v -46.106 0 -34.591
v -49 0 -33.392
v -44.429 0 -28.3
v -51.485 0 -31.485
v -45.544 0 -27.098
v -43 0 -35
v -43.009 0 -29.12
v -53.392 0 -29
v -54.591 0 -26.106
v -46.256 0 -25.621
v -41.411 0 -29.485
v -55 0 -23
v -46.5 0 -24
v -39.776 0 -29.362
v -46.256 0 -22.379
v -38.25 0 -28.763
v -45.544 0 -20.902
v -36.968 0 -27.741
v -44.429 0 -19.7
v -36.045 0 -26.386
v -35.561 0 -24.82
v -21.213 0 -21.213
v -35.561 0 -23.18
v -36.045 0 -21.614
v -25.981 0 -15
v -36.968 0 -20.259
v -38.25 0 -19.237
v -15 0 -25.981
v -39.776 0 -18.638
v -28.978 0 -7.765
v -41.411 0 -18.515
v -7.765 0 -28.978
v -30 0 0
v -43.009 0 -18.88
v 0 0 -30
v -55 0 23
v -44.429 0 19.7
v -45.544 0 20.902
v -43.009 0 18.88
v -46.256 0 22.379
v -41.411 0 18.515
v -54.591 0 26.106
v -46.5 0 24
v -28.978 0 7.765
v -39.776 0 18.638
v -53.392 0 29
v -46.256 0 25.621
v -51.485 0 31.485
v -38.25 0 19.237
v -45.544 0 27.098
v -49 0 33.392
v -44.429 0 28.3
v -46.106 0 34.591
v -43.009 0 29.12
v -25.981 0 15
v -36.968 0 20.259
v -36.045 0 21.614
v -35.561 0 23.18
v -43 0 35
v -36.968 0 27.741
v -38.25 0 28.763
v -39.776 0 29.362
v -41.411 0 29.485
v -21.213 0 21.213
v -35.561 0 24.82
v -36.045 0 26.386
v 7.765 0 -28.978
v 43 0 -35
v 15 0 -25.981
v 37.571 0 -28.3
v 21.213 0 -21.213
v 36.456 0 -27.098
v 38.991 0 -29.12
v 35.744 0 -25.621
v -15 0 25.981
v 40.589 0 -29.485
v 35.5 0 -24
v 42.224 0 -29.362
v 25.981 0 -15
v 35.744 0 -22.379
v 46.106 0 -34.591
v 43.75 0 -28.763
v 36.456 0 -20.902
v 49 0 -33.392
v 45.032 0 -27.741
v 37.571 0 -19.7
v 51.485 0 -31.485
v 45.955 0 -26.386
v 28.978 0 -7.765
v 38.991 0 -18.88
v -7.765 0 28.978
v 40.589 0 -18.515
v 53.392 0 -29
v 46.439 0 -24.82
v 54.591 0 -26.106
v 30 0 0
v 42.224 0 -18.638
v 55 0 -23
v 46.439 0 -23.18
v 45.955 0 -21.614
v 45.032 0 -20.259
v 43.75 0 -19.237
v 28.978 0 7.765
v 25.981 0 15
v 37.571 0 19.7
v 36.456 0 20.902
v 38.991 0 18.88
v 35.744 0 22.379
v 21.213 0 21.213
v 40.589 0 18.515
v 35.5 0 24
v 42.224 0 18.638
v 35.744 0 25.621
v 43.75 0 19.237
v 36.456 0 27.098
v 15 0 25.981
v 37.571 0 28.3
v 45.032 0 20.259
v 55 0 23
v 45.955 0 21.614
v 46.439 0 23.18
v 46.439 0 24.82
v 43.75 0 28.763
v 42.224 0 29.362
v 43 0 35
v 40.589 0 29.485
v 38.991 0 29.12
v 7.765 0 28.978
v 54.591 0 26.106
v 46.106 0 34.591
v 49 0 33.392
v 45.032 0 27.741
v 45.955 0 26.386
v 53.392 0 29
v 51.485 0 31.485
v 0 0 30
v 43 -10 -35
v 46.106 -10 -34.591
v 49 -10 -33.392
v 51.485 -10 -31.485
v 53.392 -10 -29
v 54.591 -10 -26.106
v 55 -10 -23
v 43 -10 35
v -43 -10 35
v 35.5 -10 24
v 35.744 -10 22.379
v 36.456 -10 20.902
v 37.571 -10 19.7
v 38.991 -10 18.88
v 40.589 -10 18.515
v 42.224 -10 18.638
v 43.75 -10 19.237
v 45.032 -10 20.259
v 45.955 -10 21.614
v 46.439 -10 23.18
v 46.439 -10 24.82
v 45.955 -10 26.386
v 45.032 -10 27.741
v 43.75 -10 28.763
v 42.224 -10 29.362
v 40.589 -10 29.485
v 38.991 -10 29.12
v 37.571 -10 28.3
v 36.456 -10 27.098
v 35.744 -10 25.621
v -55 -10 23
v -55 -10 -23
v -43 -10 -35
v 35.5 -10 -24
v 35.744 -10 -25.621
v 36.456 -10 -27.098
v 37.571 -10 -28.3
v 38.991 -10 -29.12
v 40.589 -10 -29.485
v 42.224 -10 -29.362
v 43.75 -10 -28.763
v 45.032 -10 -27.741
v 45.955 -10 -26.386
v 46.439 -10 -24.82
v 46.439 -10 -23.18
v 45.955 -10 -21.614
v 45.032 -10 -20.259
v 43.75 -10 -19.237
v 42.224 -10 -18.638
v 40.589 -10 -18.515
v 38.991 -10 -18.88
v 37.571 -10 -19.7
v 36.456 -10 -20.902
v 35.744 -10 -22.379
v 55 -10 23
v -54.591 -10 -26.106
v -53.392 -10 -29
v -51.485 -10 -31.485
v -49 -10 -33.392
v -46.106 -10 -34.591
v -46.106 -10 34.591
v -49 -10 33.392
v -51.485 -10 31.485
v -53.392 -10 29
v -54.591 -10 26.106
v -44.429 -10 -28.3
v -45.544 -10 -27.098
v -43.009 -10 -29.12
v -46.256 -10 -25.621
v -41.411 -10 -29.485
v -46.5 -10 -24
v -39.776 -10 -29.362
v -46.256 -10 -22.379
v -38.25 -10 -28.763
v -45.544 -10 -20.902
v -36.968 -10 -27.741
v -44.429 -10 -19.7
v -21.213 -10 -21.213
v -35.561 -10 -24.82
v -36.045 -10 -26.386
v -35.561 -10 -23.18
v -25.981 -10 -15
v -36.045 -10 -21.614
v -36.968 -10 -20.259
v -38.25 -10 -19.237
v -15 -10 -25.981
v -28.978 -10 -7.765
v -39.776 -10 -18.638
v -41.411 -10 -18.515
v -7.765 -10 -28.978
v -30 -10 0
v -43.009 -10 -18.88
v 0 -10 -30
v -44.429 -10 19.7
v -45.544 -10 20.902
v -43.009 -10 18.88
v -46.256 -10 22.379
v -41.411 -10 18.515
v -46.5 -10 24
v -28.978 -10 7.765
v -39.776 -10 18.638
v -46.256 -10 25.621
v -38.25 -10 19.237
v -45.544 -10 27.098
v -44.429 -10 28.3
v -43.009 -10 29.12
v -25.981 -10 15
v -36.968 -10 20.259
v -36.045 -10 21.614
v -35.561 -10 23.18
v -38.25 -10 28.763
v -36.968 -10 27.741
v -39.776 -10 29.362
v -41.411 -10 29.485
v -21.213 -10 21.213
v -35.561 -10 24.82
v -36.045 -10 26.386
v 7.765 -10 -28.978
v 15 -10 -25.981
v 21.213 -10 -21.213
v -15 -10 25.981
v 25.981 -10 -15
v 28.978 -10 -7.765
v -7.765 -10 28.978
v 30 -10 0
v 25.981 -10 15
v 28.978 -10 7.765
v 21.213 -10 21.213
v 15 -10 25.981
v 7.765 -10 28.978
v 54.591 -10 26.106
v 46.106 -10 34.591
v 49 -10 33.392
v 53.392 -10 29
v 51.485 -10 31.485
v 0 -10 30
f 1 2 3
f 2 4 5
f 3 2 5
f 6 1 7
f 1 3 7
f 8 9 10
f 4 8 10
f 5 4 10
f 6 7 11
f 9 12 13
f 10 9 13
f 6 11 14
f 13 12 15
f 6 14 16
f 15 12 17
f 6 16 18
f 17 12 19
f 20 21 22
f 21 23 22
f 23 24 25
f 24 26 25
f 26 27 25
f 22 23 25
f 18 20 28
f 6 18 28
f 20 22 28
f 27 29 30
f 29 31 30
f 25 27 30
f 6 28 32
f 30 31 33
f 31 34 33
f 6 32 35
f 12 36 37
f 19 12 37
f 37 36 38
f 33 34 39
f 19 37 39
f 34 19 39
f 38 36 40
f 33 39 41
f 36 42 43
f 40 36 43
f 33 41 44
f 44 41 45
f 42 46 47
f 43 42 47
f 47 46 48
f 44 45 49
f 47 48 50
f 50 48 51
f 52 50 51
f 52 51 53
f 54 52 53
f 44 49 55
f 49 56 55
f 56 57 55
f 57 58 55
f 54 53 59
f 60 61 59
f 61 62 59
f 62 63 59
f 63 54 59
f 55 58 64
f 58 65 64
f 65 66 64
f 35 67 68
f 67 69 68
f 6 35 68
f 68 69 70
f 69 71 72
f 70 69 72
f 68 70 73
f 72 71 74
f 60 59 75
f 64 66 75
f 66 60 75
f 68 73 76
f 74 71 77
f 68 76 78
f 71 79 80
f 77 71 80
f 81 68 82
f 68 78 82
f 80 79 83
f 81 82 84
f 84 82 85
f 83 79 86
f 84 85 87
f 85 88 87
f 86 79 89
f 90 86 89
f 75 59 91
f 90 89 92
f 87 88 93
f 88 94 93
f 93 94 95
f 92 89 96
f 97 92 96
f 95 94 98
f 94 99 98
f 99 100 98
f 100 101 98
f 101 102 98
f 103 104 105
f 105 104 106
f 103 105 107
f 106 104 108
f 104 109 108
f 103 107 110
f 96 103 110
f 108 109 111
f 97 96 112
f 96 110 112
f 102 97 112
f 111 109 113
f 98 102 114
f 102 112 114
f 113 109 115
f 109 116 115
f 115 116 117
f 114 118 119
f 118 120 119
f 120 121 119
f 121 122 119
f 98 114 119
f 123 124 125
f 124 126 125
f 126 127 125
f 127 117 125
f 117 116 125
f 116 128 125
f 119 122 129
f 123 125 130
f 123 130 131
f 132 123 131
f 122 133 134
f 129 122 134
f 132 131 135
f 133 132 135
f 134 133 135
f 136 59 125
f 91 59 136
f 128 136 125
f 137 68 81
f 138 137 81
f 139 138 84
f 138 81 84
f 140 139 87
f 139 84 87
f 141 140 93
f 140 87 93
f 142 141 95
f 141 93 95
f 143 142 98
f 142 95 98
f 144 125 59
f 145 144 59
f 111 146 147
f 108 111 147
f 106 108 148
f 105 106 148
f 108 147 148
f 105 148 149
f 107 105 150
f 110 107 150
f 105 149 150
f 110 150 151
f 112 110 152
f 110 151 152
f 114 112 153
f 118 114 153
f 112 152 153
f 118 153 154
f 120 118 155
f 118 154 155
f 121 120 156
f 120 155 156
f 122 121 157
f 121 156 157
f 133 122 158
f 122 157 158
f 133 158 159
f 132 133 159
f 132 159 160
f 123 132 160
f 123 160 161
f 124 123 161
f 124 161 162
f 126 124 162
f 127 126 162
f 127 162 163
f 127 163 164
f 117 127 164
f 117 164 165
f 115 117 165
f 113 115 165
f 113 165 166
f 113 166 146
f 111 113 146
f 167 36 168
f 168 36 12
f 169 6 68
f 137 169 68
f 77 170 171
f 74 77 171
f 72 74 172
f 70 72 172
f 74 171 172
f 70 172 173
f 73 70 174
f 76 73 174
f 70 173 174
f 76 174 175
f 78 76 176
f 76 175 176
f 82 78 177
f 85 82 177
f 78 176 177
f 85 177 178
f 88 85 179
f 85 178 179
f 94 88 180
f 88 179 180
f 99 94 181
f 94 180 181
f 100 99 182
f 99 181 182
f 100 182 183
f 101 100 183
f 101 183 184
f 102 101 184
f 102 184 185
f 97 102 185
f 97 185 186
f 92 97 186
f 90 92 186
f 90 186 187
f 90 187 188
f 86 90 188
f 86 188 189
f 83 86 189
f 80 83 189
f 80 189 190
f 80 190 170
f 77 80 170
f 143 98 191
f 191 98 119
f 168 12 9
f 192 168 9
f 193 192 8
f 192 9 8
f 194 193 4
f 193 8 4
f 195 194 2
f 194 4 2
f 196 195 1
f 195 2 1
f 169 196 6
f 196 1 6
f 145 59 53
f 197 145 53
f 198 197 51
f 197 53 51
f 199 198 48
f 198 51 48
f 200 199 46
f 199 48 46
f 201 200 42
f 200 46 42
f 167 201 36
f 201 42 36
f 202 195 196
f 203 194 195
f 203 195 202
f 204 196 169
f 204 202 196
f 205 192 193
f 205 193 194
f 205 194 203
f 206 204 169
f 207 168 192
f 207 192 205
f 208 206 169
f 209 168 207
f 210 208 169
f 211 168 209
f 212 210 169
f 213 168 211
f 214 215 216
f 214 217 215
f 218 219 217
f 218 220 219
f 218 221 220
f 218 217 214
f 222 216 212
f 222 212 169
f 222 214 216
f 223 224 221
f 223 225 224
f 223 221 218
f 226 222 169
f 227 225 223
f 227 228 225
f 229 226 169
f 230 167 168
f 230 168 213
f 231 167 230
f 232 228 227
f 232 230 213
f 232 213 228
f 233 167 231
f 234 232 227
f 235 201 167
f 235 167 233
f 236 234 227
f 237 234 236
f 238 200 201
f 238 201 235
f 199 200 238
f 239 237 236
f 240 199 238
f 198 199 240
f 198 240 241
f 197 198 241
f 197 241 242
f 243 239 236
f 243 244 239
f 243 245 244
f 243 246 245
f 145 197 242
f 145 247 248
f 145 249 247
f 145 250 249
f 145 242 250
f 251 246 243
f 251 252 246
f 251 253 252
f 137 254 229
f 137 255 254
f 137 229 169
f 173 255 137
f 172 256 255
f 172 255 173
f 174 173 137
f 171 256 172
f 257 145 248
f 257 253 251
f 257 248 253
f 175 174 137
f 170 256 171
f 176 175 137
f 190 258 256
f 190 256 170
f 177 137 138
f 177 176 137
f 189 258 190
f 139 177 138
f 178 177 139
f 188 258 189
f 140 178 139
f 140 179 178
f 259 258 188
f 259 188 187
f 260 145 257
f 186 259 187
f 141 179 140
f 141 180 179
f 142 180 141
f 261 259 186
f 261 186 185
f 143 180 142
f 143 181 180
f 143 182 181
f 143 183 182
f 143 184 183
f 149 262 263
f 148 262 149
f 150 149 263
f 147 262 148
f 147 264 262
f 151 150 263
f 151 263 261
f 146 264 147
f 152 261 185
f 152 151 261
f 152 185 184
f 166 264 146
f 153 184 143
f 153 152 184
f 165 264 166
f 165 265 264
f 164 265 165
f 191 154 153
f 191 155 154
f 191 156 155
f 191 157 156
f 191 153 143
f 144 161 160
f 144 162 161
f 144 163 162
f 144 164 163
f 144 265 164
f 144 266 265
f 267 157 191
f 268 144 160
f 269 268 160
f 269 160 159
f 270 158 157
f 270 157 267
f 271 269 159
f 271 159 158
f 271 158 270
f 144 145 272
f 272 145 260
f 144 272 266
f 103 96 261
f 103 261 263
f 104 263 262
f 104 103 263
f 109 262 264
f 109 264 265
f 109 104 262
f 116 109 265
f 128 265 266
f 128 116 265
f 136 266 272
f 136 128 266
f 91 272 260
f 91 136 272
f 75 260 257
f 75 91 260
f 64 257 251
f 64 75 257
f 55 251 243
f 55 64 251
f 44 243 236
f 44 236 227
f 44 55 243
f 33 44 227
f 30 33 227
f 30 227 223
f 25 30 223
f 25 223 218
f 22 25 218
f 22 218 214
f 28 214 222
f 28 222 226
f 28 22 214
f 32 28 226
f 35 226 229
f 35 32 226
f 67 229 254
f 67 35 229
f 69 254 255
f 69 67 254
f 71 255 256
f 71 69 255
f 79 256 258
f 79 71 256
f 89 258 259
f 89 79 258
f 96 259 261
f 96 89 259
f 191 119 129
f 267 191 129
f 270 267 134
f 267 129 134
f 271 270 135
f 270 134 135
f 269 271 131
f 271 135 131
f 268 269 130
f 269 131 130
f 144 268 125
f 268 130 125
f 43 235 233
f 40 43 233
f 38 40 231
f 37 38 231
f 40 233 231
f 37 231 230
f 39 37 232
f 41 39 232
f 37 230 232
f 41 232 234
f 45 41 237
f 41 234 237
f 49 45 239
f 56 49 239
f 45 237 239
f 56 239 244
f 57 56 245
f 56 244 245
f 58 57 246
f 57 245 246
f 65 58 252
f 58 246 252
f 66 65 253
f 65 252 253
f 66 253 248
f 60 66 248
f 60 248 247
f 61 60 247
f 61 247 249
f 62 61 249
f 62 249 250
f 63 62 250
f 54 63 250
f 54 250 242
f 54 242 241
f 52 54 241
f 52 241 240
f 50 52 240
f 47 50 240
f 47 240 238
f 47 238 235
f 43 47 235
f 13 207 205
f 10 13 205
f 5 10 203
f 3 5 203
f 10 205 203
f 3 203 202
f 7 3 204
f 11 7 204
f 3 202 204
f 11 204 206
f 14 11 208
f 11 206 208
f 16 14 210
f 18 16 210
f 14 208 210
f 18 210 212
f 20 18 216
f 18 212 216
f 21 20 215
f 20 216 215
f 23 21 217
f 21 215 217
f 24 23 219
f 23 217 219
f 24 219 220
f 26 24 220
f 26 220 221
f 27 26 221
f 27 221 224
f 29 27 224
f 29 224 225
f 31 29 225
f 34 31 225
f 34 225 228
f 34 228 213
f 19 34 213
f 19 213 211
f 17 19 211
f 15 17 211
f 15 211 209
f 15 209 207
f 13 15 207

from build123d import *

# Parameters (mm, degrees)
F0_R     = 30
F1_DEPTH = 10
F2_D     = 11


with BuildPart() as f1:
    # F0 (on Front) → F1 (new body)
    with BuildSketch(Plane.XZ):
        with BuildLine():
            ThreePointArc((55, 23), (51.485281, 31.485281), (43, 35))
            Line((43, 35), (-43, 35))
            ThreePointArc((-43, 35), (-51.485281, 31.485281), (-55, 23))
            Line((-55, 23), (-55, -23))
            ThreePointArc((-55, -23), (-51.485281, -31.485281), (-43, -35))
            Line((-43, -35), (43, -35))
            ThreePointArc((43, -35), (51.485281, -31.485281), (55, -23))
            Line((55, -23), (55, 23))
        make_face()
        Circle(F0_R, mode=Mode.SUBTRACT)
    extrude(amount=F1_DEPTH)

    # F2 (through all)
    with Locations(Plane(origin=(0, 0, 0), x_dir=(1, 0, 0), z_dir=(0, 1, 0))):
        with Locations((-41, 24), (41, 24), (41, -24), (-41, -24)):
            Hole(F2_D / 2)


solid = f1.part
